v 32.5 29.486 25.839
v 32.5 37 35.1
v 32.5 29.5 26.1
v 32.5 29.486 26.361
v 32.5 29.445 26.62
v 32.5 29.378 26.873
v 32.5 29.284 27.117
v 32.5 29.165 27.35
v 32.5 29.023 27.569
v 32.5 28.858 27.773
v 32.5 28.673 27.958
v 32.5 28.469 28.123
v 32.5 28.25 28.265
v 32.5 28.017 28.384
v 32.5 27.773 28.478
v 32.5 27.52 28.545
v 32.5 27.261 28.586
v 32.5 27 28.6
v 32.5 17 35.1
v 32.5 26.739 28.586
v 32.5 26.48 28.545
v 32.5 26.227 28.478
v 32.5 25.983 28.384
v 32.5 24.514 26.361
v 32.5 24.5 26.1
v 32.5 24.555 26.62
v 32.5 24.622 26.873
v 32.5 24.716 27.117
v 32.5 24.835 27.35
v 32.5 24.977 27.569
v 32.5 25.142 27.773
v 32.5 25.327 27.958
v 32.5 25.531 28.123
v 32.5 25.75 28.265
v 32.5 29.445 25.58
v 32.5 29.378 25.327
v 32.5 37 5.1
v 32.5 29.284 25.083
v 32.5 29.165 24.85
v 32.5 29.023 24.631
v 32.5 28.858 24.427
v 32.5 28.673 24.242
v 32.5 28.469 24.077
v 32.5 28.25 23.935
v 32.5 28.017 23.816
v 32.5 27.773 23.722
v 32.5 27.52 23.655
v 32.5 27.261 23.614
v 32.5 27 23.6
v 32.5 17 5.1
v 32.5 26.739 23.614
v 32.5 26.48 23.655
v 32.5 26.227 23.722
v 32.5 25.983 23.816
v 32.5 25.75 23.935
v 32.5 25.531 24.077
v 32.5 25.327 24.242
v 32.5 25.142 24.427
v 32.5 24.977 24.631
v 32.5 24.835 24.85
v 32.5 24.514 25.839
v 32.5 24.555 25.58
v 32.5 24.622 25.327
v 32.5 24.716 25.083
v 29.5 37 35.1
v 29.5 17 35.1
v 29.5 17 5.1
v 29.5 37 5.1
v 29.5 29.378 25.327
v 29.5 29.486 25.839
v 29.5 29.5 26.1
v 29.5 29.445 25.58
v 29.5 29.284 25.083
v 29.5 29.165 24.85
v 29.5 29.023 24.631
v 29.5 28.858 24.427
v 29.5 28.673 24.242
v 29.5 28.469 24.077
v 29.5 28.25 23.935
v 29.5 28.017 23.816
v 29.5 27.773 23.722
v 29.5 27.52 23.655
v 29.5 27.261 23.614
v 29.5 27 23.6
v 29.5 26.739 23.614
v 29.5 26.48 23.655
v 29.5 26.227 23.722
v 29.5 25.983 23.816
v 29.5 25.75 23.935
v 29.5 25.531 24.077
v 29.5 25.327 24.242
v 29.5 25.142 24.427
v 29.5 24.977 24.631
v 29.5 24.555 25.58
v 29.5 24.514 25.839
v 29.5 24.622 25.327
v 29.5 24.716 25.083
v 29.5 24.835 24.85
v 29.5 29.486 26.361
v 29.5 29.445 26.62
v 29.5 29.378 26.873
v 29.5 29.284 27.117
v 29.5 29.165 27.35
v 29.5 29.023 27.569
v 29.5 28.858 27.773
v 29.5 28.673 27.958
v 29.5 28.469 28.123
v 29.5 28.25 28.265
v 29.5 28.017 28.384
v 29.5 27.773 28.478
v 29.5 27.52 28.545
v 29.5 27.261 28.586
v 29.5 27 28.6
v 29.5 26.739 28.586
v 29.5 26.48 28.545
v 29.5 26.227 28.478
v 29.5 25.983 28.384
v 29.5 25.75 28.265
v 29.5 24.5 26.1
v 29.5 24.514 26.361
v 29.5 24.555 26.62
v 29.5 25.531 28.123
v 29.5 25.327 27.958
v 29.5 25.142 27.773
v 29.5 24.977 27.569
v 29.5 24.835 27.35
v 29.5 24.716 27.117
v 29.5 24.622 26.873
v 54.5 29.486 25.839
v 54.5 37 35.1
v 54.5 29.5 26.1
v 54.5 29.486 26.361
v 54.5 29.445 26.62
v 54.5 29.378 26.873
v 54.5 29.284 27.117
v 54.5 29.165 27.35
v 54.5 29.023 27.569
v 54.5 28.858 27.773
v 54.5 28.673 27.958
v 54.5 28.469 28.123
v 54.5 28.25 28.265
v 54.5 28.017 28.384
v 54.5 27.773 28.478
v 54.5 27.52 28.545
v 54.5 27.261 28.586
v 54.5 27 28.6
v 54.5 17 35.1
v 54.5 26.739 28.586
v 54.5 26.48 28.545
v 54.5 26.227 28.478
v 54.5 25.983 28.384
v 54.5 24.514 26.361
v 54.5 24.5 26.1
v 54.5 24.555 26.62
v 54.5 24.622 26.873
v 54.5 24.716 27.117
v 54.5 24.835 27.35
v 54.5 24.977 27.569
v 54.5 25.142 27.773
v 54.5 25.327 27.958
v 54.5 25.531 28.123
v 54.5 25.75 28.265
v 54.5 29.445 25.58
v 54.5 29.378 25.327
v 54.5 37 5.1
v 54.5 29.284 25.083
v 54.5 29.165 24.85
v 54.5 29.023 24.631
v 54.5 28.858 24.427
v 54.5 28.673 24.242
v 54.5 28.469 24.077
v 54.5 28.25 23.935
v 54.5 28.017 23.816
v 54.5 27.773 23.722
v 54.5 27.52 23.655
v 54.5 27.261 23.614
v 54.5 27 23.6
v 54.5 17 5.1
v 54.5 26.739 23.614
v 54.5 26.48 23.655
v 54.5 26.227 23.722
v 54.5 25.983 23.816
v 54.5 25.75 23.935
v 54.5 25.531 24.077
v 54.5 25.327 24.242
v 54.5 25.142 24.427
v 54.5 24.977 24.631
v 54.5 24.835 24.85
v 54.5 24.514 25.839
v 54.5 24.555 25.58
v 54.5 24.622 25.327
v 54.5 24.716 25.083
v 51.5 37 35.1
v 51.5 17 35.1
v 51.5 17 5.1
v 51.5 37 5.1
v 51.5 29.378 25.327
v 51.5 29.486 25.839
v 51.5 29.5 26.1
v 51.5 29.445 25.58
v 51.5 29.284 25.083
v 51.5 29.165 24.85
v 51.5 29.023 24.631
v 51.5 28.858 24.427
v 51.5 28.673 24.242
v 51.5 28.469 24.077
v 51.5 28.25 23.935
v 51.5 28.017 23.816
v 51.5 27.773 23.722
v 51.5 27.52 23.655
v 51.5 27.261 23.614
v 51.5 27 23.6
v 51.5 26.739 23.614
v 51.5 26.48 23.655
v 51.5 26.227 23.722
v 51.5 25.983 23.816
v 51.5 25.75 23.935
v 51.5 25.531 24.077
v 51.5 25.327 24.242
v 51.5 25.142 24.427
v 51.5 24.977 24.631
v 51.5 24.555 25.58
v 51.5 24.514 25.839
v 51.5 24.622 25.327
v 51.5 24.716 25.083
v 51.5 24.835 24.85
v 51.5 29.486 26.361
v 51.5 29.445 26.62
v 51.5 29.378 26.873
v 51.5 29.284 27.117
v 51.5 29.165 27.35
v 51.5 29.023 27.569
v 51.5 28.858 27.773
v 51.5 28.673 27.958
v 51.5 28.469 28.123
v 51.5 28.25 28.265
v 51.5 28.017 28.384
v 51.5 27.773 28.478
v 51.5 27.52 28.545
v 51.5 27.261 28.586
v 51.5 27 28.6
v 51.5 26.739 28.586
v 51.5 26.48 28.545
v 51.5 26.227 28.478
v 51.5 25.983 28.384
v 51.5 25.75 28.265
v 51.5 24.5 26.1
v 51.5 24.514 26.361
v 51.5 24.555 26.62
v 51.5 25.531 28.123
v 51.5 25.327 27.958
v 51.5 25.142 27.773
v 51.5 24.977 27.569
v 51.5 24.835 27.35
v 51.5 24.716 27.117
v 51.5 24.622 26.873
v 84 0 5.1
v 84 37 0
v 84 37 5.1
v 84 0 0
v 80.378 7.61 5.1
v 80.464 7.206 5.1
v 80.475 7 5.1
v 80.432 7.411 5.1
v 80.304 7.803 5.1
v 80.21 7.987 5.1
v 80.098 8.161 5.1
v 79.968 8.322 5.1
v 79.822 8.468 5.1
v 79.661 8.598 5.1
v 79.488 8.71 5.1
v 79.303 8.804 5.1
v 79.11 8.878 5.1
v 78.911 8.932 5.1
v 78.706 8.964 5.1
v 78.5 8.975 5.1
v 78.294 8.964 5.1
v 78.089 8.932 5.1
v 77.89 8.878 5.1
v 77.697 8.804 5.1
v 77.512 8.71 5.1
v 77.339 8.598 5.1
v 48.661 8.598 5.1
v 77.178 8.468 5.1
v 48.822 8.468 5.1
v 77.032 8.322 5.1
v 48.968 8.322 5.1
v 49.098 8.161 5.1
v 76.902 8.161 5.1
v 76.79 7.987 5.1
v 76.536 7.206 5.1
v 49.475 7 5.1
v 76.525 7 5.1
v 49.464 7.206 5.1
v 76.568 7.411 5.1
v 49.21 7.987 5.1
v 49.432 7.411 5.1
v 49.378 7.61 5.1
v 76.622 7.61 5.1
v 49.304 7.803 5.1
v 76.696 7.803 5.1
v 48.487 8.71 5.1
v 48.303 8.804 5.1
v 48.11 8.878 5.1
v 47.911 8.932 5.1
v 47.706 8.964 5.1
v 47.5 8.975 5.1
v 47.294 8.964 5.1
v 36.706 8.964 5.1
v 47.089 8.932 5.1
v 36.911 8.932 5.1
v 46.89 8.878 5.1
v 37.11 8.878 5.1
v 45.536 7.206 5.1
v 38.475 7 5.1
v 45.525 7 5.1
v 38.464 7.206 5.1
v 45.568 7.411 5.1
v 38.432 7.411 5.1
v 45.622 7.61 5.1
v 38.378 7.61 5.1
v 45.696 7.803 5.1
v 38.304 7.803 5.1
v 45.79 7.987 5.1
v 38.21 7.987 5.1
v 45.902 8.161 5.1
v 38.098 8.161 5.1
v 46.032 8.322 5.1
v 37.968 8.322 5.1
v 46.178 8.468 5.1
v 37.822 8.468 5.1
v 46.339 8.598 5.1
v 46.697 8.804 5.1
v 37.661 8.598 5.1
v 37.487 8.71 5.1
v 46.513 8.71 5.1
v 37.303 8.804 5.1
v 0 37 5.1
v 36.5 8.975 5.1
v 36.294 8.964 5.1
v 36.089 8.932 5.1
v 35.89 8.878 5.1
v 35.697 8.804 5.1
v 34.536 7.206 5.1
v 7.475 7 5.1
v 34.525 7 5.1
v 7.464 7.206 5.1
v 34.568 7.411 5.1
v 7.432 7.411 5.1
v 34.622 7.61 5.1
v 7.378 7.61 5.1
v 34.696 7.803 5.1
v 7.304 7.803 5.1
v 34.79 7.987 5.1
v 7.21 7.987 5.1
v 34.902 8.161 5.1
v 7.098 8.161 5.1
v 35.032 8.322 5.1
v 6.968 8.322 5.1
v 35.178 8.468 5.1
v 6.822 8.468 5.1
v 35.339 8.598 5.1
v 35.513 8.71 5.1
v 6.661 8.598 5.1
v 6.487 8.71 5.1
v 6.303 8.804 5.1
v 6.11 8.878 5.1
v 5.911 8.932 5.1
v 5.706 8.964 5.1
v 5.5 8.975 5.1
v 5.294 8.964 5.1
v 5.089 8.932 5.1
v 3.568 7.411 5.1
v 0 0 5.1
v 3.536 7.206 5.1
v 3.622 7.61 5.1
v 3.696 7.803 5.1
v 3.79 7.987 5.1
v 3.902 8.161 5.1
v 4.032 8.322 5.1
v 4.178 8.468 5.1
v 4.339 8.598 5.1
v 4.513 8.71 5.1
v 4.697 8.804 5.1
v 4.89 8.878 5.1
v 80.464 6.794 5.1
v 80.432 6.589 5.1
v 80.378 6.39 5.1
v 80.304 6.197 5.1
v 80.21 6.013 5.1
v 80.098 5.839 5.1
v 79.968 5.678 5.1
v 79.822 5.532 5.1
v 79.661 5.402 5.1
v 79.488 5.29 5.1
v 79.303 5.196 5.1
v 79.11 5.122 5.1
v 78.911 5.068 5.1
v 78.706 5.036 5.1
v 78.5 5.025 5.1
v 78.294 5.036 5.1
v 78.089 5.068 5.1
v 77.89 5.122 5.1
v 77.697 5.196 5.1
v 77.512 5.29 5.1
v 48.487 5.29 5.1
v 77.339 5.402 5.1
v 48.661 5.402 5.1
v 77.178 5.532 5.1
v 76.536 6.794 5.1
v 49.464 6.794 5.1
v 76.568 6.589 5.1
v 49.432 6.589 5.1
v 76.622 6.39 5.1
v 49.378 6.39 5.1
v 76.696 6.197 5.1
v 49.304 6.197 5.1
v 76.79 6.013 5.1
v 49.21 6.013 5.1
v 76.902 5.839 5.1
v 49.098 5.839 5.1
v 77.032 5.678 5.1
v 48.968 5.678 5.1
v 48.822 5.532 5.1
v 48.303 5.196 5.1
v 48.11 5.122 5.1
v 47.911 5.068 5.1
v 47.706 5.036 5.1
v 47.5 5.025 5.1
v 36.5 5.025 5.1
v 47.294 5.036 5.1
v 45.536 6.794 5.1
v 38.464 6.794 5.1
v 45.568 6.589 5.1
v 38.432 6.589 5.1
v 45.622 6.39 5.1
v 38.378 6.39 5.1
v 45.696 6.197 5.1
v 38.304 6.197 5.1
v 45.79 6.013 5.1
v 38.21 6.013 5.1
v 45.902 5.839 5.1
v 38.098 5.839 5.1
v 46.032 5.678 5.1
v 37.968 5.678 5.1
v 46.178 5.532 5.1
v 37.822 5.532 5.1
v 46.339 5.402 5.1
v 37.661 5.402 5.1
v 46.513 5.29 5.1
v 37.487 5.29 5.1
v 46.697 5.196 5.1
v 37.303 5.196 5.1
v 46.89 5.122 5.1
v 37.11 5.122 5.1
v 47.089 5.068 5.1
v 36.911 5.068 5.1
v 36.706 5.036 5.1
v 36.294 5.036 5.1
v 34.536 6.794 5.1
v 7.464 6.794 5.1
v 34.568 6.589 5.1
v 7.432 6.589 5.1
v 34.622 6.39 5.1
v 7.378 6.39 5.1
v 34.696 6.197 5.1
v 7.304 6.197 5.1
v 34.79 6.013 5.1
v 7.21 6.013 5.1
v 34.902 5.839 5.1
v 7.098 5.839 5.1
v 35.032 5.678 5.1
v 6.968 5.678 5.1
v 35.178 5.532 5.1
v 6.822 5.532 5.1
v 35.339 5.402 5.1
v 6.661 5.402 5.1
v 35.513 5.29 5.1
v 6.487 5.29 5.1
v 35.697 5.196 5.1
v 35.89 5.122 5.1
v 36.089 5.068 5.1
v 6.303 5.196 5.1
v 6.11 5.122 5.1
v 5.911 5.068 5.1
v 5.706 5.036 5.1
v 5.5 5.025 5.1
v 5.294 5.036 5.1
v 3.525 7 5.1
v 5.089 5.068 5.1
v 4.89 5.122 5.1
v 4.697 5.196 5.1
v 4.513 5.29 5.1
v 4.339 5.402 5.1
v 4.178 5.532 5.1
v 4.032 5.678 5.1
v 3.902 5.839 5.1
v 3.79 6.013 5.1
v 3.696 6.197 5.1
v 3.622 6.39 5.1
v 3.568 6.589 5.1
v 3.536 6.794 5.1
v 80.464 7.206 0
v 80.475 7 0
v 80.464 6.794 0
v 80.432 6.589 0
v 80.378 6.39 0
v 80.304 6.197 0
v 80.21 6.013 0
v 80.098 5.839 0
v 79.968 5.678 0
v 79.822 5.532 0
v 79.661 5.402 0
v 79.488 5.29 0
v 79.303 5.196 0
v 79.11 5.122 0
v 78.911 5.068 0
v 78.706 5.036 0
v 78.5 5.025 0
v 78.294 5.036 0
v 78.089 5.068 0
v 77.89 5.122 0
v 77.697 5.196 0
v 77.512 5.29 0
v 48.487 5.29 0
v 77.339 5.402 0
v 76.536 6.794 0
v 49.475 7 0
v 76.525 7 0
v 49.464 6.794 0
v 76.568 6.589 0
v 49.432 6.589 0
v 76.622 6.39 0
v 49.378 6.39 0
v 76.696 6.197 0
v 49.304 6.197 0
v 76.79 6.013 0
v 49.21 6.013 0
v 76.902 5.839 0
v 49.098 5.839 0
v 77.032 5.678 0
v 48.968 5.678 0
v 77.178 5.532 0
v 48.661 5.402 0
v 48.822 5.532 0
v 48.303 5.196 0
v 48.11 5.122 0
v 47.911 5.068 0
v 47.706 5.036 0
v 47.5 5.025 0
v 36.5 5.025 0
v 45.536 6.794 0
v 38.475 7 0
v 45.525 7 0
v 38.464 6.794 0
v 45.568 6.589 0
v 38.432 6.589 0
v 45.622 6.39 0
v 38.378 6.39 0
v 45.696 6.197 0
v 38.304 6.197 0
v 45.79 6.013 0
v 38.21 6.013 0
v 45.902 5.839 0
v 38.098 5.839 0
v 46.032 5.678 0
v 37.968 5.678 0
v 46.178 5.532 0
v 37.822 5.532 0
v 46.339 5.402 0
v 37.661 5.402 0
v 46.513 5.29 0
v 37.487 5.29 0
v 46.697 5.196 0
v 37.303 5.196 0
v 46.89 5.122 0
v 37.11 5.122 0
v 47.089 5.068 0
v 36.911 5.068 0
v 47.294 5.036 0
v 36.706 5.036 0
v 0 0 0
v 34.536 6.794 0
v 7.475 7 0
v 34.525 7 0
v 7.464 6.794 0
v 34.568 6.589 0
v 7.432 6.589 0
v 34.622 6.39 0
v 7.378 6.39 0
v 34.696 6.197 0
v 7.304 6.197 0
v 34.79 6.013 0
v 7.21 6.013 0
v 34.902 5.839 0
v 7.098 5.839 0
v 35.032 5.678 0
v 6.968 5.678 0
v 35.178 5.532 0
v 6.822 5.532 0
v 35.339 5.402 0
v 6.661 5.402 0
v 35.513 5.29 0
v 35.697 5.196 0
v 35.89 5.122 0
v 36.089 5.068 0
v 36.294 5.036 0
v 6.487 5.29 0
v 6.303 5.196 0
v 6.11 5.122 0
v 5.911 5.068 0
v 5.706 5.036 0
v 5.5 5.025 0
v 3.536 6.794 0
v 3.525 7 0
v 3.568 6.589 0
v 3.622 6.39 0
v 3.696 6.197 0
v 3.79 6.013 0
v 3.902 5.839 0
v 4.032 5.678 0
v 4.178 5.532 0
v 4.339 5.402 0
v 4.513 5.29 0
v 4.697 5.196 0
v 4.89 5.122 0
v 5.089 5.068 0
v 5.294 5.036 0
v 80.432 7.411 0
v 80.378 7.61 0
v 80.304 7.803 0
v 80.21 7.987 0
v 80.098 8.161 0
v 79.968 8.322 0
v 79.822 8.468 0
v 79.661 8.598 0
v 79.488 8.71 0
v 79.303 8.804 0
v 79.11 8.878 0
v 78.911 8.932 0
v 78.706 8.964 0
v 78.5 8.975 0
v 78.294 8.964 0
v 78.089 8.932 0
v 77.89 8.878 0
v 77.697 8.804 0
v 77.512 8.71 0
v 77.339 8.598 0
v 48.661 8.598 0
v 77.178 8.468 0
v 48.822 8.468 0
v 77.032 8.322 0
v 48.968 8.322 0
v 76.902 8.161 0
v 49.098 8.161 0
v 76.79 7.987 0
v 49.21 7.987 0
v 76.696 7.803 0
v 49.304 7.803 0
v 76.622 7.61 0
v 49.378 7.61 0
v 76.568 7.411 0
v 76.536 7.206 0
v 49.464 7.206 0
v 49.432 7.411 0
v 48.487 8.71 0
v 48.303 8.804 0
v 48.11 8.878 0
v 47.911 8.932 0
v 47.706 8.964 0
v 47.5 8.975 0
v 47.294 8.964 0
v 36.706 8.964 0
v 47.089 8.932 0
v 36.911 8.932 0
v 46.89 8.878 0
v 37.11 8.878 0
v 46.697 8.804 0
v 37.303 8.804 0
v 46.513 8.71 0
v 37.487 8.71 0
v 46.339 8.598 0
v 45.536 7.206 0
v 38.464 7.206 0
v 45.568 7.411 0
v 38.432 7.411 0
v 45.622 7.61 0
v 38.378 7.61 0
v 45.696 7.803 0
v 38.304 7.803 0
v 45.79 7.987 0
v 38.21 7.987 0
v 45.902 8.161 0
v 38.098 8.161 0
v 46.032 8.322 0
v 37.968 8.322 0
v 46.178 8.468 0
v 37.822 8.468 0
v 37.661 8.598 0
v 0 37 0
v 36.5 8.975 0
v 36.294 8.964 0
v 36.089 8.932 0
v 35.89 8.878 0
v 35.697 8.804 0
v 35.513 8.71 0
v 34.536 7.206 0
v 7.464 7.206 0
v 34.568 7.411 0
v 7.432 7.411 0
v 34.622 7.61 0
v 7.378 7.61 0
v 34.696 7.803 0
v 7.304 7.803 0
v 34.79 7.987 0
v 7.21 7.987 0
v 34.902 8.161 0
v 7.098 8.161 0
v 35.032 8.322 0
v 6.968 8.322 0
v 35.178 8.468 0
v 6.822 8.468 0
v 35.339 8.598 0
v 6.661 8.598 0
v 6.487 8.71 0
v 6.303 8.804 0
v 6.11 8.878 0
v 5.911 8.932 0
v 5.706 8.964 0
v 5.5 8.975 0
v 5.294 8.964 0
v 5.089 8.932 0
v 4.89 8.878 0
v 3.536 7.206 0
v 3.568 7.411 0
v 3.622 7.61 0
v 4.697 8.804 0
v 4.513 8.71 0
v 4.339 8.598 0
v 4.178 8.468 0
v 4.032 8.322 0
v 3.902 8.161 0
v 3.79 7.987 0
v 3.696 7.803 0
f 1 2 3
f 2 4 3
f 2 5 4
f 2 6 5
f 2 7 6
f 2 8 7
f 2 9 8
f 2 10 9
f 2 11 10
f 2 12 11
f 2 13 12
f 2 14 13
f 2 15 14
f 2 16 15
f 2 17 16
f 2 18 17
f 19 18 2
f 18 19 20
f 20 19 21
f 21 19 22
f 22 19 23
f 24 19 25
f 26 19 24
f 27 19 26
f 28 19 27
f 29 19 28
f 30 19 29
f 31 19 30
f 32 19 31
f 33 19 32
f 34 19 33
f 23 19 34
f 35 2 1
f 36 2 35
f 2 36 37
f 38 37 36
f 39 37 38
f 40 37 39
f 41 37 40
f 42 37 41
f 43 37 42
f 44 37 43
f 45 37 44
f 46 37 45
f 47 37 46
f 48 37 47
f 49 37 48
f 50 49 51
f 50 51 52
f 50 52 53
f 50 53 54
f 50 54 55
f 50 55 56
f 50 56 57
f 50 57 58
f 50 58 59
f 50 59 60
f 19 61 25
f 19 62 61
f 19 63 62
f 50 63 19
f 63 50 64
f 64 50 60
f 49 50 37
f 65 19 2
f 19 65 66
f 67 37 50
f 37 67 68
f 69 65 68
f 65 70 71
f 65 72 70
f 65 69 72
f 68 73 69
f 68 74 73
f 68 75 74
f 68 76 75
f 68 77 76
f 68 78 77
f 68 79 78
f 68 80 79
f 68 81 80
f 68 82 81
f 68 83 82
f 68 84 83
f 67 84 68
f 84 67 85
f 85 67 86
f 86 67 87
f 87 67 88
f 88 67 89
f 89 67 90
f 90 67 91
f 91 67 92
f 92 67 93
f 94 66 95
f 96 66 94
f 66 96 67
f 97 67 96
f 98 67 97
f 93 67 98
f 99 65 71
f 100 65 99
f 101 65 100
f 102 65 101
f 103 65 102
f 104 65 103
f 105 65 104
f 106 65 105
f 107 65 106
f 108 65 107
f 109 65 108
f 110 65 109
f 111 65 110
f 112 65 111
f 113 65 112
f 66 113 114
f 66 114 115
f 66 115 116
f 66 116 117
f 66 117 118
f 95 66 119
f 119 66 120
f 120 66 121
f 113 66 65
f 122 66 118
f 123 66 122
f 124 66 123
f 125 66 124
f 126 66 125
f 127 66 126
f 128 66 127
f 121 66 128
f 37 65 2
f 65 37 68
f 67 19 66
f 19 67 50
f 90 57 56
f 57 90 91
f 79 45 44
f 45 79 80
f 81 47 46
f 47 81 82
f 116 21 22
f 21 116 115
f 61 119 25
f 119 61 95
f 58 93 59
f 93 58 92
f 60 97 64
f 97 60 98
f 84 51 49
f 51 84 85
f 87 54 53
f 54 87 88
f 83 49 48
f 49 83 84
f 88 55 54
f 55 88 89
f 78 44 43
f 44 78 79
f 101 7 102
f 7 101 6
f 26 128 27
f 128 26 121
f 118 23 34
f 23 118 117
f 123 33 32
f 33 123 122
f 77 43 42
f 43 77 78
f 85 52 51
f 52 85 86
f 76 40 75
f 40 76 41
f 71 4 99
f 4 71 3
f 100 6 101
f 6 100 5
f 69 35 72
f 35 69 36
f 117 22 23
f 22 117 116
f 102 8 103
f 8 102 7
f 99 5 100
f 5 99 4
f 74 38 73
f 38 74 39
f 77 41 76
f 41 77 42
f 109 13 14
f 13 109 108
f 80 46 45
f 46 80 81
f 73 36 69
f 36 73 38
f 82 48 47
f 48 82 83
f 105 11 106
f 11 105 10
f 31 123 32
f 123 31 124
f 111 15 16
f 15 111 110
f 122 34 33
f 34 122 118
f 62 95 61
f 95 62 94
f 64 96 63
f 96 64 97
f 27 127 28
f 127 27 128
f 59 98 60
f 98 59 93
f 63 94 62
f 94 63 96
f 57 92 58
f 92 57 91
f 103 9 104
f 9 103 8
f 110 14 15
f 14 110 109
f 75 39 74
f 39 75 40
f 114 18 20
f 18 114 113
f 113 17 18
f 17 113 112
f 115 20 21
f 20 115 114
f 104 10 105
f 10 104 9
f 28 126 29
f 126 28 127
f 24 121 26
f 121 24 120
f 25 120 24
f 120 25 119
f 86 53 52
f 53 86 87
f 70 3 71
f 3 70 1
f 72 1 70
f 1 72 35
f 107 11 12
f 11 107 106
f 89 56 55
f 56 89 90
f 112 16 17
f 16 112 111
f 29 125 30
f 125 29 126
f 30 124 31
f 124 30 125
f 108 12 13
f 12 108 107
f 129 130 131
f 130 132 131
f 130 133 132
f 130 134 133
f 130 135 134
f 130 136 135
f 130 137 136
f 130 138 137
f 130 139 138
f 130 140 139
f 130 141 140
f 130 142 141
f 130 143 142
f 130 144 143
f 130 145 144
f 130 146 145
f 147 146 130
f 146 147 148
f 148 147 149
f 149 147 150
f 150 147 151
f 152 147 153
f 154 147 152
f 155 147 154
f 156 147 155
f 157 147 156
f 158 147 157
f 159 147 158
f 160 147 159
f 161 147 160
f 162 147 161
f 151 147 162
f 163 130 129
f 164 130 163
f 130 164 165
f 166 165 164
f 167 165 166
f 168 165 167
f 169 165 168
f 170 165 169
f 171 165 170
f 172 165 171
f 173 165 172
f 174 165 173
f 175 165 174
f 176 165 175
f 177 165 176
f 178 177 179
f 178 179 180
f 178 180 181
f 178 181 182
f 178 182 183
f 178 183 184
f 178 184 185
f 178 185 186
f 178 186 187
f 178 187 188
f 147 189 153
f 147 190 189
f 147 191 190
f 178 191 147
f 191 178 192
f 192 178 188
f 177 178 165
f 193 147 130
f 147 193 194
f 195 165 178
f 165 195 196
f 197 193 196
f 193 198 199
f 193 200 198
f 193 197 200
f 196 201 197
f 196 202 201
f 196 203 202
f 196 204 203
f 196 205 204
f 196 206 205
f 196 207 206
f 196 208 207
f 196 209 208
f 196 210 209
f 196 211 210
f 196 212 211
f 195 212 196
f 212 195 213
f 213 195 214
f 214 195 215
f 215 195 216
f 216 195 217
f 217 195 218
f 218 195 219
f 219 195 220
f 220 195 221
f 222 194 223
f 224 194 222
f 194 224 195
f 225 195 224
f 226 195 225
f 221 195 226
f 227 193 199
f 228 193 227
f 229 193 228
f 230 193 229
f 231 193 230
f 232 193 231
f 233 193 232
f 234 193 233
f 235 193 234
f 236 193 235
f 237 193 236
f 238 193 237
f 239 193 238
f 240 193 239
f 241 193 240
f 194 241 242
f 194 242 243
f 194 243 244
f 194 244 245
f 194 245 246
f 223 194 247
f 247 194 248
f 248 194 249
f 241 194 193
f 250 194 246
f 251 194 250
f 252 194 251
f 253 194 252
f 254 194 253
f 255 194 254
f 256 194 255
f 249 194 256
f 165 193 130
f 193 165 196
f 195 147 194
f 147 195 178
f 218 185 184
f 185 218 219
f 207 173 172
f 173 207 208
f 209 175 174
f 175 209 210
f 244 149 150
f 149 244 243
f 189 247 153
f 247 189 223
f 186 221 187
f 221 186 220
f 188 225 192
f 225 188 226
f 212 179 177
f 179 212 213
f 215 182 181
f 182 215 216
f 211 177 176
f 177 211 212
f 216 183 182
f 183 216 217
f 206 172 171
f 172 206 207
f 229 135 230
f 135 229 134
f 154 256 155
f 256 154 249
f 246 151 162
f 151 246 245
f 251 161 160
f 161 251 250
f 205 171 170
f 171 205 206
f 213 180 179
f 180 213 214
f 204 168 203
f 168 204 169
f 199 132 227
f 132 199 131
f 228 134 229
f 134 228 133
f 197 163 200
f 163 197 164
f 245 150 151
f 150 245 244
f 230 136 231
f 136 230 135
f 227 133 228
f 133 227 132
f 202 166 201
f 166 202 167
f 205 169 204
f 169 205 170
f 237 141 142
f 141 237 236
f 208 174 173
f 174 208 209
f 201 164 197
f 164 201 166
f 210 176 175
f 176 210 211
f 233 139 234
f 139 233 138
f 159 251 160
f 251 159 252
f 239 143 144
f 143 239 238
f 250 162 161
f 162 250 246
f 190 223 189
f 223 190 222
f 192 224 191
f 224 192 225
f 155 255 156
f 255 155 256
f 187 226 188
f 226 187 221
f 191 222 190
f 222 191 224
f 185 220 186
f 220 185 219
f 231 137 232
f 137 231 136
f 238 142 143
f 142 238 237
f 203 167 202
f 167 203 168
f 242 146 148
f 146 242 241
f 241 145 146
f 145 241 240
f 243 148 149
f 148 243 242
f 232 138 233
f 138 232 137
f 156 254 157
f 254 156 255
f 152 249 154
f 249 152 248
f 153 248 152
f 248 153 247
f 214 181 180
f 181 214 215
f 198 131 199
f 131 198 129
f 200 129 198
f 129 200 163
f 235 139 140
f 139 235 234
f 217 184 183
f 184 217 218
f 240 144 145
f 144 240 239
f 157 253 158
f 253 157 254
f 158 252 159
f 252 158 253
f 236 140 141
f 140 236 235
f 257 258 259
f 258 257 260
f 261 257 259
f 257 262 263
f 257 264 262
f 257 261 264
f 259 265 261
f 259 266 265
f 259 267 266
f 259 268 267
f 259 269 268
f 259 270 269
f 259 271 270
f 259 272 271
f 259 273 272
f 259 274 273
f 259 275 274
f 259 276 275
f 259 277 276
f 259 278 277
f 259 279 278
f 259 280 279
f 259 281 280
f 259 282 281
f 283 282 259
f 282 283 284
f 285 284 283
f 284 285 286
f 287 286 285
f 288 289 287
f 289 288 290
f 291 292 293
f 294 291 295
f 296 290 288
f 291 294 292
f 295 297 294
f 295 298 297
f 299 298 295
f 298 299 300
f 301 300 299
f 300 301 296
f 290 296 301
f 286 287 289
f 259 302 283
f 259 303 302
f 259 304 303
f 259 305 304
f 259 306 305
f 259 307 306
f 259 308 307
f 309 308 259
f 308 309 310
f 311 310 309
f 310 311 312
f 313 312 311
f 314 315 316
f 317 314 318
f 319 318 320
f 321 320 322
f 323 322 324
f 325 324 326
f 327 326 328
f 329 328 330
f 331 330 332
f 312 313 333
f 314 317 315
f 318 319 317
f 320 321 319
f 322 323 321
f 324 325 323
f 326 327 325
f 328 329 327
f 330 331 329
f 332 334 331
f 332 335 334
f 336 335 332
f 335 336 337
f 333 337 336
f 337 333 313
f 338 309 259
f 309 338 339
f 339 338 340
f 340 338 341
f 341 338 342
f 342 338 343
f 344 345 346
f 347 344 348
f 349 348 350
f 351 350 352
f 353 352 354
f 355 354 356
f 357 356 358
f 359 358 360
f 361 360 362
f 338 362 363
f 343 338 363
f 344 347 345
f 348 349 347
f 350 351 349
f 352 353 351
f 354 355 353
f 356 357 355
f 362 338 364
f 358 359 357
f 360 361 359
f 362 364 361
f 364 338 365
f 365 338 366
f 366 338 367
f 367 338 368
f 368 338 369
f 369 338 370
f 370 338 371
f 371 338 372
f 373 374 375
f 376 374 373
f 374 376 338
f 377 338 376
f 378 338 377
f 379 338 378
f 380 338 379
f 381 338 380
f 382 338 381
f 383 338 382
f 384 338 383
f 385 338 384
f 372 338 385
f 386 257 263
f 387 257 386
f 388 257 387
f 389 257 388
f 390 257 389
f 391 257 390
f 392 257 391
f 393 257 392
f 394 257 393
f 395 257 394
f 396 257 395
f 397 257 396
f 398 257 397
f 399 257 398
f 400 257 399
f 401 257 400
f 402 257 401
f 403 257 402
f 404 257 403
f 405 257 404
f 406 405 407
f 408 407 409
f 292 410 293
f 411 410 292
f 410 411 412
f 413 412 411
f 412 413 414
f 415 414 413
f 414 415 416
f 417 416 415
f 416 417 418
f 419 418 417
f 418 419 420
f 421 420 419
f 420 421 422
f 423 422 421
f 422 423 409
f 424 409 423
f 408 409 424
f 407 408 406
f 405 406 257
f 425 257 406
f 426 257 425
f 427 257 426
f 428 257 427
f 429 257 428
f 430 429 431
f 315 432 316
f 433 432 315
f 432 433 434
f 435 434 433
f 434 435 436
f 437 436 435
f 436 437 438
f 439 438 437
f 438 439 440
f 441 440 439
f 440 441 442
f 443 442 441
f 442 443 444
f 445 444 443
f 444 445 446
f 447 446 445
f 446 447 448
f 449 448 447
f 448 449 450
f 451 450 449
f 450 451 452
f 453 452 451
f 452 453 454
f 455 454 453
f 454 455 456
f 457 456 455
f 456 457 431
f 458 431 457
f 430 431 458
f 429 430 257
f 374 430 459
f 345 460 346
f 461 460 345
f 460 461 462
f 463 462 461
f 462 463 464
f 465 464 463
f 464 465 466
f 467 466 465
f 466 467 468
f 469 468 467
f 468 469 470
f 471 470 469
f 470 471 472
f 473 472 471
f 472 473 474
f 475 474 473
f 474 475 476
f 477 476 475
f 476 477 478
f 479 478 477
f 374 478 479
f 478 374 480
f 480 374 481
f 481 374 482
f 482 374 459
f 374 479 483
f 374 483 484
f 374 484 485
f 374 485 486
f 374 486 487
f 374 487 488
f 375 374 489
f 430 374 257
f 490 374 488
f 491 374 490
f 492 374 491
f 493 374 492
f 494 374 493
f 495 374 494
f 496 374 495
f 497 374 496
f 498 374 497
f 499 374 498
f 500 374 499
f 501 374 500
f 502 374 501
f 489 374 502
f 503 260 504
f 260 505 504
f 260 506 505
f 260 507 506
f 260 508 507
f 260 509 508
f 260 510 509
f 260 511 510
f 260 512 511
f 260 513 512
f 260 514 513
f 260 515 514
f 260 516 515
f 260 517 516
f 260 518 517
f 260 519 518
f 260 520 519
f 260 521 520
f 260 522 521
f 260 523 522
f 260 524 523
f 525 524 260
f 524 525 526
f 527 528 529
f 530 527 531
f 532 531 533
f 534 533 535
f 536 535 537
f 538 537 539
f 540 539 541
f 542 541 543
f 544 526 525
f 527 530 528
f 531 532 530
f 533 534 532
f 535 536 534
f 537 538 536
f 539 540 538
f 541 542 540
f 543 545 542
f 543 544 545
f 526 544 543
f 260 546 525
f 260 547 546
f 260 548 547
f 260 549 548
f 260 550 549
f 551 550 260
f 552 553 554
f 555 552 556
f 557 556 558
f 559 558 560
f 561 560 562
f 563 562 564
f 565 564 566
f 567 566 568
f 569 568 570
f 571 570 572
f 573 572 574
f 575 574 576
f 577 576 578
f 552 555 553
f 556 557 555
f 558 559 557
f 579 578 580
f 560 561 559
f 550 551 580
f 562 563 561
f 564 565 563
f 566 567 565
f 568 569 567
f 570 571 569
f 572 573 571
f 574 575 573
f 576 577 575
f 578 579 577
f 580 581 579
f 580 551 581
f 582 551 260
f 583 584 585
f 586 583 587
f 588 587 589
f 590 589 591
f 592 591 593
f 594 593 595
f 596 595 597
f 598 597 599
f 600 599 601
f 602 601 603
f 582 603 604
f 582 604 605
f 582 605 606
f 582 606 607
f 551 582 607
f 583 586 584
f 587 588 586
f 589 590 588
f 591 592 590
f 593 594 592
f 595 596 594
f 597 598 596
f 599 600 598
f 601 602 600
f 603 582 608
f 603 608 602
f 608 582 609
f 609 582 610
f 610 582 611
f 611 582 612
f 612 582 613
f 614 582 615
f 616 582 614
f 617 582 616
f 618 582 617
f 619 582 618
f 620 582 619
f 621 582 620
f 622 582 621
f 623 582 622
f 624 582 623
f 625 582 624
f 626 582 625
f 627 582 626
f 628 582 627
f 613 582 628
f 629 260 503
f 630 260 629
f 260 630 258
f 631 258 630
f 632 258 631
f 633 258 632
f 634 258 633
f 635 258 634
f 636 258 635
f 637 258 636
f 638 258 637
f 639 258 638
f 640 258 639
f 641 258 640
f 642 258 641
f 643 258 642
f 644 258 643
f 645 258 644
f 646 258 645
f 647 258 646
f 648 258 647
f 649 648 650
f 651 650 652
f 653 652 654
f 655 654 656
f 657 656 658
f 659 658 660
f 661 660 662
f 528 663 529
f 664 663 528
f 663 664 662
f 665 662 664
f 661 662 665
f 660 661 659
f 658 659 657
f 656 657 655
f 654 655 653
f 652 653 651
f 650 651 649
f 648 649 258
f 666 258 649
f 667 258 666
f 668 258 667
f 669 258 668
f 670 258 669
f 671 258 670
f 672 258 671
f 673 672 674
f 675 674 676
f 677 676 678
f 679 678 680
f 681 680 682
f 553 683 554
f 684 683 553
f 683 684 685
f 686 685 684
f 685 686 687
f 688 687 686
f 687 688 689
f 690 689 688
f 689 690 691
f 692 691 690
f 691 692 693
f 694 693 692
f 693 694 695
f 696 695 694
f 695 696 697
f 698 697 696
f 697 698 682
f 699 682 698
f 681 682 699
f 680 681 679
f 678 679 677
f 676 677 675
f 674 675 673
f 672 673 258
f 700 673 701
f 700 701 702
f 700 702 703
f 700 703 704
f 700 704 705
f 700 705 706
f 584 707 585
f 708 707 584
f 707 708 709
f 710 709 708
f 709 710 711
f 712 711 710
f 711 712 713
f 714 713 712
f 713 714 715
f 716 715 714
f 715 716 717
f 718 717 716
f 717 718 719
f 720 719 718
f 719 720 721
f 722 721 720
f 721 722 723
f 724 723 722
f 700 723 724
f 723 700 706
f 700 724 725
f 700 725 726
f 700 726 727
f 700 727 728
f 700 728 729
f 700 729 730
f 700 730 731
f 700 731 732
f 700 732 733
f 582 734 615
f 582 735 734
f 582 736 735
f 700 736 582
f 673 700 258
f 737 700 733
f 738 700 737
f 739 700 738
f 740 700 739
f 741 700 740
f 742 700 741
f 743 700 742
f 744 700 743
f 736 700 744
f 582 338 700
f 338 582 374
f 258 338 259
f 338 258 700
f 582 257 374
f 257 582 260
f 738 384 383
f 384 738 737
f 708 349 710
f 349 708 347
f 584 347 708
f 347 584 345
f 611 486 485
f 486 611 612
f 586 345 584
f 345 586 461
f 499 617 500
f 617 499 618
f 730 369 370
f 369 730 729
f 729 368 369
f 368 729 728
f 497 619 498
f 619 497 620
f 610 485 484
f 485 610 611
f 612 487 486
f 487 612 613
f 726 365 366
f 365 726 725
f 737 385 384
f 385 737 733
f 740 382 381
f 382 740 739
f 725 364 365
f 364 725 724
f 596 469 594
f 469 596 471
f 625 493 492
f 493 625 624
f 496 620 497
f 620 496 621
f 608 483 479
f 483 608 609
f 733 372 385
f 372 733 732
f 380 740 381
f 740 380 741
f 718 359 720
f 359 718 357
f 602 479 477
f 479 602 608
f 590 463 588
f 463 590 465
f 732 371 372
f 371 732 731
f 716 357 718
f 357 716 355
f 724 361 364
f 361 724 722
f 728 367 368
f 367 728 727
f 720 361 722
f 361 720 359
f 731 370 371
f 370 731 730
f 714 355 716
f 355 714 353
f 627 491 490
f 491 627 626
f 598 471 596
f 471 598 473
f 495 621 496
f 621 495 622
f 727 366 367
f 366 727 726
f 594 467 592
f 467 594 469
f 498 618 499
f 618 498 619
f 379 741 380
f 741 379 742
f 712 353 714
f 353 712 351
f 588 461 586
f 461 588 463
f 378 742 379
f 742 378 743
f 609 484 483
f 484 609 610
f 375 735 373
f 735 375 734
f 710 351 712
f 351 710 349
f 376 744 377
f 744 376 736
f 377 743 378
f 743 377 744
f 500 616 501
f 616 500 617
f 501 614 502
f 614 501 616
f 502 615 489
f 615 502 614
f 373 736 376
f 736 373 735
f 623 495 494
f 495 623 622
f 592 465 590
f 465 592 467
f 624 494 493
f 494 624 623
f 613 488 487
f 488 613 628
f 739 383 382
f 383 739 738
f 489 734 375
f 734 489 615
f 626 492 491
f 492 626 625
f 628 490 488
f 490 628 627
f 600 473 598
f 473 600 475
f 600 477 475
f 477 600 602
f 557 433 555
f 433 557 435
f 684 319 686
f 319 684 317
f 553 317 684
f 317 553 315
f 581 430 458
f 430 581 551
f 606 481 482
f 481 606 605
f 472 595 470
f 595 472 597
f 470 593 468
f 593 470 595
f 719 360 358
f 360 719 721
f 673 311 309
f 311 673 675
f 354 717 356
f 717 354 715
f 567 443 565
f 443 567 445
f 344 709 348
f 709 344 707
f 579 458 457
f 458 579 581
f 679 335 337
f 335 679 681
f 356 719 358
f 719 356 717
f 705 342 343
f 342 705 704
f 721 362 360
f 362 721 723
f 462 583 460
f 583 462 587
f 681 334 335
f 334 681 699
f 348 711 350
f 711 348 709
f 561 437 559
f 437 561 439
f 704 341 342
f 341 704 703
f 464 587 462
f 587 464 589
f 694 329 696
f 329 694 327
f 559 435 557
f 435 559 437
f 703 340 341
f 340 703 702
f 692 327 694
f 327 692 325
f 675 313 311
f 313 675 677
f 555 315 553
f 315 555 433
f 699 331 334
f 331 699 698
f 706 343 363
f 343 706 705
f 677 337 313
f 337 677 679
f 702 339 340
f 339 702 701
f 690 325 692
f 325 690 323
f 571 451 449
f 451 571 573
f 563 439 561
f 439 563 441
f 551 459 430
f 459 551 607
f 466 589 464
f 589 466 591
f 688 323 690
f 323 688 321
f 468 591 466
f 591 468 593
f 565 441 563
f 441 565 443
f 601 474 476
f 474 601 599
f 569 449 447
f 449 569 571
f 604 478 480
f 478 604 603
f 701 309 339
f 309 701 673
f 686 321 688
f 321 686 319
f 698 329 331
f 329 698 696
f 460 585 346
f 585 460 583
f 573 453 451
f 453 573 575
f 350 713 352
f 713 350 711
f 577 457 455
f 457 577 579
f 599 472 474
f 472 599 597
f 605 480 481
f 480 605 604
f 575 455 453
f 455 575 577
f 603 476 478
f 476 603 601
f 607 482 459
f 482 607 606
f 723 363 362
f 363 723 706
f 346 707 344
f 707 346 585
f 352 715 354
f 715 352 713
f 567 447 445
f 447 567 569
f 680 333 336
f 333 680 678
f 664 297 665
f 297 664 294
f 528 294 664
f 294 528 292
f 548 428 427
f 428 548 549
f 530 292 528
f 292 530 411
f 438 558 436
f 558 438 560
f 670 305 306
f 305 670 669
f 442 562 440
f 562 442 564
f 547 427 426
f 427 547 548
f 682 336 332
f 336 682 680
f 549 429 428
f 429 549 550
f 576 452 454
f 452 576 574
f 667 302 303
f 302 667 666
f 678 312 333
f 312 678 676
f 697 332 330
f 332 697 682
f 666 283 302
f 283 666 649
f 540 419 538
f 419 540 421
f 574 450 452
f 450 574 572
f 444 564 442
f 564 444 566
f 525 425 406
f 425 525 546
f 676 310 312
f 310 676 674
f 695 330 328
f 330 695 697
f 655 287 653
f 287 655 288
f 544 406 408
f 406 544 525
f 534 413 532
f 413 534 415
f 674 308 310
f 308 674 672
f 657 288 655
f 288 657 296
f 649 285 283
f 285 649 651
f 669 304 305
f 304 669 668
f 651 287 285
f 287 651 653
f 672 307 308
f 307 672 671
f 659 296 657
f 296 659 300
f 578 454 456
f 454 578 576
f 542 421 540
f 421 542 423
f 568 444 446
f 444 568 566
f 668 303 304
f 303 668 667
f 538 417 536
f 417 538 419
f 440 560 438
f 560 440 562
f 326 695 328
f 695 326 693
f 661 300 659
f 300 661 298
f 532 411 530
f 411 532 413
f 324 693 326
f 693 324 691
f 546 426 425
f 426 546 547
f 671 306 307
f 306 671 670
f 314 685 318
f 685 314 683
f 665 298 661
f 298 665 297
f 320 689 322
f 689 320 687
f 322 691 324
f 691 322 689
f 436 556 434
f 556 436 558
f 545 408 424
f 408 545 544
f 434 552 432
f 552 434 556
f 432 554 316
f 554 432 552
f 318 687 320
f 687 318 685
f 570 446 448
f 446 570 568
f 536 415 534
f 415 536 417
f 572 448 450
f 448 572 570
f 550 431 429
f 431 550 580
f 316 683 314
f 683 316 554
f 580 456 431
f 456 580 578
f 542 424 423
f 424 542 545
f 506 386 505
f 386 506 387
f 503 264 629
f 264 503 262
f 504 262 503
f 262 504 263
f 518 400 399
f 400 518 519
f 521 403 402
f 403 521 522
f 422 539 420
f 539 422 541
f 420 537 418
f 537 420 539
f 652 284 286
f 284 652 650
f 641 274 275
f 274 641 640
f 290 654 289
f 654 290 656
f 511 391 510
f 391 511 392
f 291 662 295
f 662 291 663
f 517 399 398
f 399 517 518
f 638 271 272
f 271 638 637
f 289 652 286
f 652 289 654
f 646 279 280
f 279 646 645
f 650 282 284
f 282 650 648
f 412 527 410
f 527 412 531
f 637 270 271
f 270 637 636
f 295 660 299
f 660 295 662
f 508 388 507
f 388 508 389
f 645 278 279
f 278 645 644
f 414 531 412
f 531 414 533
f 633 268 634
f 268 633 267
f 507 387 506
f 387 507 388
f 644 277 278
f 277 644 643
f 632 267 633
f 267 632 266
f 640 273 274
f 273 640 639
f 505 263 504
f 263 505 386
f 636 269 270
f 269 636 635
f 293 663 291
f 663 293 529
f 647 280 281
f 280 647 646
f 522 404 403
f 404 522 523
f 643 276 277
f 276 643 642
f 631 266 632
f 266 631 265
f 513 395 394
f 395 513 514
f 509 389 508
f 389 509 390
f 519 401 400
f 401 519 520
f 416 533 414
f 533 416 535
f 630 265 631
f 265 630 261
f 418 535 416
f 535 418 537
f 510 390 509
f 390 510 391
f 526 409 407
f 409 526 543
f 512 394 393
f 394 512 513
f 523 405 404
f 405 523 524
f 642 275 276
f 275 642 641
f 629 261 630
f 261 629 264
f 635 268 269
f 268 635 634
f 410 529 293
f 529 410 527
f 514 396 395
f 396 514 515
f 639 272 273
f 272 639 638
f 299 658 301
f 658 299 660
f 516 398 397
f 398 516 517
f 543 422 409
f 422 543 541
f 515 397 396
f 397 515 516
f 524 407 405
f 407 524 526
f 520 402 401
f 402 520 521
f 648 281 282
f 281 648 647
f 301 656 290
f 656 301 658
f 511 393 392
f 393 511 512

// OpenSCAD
$fn=60;
plate_width = 37;
plate_length = 84;
thickness = 5.1;
support_hole_diameter = 3.95;
support_hole_dist = 31;
support_hole_edge_dist = 7;
pillar_separation = 19;
pillar_thickness = 3;
pillar_width = 20;
pillar_height = 30;
pillar_hole_height =  21;
pillar_hole_diameter = 5;

module pillars(){
    translate([-pillar_separation/2, 0, 0]){
        translate([-pillar_thickness, 0, 0])
        difference(){
            cube([pillar_thickness, pillar_width, pillar_height]);
            translate([0, pillar_width/2, pillar_hole_height])
            rotate([0, 90, 0])
            cylinder(d=pillar_hole_diameter, h=pillar_thickness);
        }
        translate([pillar_separation, 0, 0])
        difference(){
            cube([pillar_thickness, pillar_width, pillar_height]);
            translate([0, pillar_width/2, pillar_hole_height])
            rotate([0, 90, 0])
            cylinder(d=pillar_hole_diameter, h=pillar_thickness);
        }
    }
}

module support_holes(){
    translate([plate_length/4 - support_hole_dist/2, support_hole_edge_dist, 0]){
        cylinder(d=support_hole_diameter, h=thickness);
        translate([support_hole_dist, 0, 0])
        cylinder(d=support_hole_diameter, h=thickness);
    }
    translate([3*plate_length/4 - support_hole_dist/2, support_hole_edge_dist, 0]){
        cylinder(d=support_hole_diameter, h=thickness);
        translate([support_hole_dist, 0, 0])
        cylinder(d=support_hole_diameter, h=thickness);
    }
}

difference(){
    union(){
        cube([plate_length, plate_width, thickness]);
        translate([plate_length/2, plate_width-pillar_width, thickness])
        pillars();
    }
    support_holes();
}
